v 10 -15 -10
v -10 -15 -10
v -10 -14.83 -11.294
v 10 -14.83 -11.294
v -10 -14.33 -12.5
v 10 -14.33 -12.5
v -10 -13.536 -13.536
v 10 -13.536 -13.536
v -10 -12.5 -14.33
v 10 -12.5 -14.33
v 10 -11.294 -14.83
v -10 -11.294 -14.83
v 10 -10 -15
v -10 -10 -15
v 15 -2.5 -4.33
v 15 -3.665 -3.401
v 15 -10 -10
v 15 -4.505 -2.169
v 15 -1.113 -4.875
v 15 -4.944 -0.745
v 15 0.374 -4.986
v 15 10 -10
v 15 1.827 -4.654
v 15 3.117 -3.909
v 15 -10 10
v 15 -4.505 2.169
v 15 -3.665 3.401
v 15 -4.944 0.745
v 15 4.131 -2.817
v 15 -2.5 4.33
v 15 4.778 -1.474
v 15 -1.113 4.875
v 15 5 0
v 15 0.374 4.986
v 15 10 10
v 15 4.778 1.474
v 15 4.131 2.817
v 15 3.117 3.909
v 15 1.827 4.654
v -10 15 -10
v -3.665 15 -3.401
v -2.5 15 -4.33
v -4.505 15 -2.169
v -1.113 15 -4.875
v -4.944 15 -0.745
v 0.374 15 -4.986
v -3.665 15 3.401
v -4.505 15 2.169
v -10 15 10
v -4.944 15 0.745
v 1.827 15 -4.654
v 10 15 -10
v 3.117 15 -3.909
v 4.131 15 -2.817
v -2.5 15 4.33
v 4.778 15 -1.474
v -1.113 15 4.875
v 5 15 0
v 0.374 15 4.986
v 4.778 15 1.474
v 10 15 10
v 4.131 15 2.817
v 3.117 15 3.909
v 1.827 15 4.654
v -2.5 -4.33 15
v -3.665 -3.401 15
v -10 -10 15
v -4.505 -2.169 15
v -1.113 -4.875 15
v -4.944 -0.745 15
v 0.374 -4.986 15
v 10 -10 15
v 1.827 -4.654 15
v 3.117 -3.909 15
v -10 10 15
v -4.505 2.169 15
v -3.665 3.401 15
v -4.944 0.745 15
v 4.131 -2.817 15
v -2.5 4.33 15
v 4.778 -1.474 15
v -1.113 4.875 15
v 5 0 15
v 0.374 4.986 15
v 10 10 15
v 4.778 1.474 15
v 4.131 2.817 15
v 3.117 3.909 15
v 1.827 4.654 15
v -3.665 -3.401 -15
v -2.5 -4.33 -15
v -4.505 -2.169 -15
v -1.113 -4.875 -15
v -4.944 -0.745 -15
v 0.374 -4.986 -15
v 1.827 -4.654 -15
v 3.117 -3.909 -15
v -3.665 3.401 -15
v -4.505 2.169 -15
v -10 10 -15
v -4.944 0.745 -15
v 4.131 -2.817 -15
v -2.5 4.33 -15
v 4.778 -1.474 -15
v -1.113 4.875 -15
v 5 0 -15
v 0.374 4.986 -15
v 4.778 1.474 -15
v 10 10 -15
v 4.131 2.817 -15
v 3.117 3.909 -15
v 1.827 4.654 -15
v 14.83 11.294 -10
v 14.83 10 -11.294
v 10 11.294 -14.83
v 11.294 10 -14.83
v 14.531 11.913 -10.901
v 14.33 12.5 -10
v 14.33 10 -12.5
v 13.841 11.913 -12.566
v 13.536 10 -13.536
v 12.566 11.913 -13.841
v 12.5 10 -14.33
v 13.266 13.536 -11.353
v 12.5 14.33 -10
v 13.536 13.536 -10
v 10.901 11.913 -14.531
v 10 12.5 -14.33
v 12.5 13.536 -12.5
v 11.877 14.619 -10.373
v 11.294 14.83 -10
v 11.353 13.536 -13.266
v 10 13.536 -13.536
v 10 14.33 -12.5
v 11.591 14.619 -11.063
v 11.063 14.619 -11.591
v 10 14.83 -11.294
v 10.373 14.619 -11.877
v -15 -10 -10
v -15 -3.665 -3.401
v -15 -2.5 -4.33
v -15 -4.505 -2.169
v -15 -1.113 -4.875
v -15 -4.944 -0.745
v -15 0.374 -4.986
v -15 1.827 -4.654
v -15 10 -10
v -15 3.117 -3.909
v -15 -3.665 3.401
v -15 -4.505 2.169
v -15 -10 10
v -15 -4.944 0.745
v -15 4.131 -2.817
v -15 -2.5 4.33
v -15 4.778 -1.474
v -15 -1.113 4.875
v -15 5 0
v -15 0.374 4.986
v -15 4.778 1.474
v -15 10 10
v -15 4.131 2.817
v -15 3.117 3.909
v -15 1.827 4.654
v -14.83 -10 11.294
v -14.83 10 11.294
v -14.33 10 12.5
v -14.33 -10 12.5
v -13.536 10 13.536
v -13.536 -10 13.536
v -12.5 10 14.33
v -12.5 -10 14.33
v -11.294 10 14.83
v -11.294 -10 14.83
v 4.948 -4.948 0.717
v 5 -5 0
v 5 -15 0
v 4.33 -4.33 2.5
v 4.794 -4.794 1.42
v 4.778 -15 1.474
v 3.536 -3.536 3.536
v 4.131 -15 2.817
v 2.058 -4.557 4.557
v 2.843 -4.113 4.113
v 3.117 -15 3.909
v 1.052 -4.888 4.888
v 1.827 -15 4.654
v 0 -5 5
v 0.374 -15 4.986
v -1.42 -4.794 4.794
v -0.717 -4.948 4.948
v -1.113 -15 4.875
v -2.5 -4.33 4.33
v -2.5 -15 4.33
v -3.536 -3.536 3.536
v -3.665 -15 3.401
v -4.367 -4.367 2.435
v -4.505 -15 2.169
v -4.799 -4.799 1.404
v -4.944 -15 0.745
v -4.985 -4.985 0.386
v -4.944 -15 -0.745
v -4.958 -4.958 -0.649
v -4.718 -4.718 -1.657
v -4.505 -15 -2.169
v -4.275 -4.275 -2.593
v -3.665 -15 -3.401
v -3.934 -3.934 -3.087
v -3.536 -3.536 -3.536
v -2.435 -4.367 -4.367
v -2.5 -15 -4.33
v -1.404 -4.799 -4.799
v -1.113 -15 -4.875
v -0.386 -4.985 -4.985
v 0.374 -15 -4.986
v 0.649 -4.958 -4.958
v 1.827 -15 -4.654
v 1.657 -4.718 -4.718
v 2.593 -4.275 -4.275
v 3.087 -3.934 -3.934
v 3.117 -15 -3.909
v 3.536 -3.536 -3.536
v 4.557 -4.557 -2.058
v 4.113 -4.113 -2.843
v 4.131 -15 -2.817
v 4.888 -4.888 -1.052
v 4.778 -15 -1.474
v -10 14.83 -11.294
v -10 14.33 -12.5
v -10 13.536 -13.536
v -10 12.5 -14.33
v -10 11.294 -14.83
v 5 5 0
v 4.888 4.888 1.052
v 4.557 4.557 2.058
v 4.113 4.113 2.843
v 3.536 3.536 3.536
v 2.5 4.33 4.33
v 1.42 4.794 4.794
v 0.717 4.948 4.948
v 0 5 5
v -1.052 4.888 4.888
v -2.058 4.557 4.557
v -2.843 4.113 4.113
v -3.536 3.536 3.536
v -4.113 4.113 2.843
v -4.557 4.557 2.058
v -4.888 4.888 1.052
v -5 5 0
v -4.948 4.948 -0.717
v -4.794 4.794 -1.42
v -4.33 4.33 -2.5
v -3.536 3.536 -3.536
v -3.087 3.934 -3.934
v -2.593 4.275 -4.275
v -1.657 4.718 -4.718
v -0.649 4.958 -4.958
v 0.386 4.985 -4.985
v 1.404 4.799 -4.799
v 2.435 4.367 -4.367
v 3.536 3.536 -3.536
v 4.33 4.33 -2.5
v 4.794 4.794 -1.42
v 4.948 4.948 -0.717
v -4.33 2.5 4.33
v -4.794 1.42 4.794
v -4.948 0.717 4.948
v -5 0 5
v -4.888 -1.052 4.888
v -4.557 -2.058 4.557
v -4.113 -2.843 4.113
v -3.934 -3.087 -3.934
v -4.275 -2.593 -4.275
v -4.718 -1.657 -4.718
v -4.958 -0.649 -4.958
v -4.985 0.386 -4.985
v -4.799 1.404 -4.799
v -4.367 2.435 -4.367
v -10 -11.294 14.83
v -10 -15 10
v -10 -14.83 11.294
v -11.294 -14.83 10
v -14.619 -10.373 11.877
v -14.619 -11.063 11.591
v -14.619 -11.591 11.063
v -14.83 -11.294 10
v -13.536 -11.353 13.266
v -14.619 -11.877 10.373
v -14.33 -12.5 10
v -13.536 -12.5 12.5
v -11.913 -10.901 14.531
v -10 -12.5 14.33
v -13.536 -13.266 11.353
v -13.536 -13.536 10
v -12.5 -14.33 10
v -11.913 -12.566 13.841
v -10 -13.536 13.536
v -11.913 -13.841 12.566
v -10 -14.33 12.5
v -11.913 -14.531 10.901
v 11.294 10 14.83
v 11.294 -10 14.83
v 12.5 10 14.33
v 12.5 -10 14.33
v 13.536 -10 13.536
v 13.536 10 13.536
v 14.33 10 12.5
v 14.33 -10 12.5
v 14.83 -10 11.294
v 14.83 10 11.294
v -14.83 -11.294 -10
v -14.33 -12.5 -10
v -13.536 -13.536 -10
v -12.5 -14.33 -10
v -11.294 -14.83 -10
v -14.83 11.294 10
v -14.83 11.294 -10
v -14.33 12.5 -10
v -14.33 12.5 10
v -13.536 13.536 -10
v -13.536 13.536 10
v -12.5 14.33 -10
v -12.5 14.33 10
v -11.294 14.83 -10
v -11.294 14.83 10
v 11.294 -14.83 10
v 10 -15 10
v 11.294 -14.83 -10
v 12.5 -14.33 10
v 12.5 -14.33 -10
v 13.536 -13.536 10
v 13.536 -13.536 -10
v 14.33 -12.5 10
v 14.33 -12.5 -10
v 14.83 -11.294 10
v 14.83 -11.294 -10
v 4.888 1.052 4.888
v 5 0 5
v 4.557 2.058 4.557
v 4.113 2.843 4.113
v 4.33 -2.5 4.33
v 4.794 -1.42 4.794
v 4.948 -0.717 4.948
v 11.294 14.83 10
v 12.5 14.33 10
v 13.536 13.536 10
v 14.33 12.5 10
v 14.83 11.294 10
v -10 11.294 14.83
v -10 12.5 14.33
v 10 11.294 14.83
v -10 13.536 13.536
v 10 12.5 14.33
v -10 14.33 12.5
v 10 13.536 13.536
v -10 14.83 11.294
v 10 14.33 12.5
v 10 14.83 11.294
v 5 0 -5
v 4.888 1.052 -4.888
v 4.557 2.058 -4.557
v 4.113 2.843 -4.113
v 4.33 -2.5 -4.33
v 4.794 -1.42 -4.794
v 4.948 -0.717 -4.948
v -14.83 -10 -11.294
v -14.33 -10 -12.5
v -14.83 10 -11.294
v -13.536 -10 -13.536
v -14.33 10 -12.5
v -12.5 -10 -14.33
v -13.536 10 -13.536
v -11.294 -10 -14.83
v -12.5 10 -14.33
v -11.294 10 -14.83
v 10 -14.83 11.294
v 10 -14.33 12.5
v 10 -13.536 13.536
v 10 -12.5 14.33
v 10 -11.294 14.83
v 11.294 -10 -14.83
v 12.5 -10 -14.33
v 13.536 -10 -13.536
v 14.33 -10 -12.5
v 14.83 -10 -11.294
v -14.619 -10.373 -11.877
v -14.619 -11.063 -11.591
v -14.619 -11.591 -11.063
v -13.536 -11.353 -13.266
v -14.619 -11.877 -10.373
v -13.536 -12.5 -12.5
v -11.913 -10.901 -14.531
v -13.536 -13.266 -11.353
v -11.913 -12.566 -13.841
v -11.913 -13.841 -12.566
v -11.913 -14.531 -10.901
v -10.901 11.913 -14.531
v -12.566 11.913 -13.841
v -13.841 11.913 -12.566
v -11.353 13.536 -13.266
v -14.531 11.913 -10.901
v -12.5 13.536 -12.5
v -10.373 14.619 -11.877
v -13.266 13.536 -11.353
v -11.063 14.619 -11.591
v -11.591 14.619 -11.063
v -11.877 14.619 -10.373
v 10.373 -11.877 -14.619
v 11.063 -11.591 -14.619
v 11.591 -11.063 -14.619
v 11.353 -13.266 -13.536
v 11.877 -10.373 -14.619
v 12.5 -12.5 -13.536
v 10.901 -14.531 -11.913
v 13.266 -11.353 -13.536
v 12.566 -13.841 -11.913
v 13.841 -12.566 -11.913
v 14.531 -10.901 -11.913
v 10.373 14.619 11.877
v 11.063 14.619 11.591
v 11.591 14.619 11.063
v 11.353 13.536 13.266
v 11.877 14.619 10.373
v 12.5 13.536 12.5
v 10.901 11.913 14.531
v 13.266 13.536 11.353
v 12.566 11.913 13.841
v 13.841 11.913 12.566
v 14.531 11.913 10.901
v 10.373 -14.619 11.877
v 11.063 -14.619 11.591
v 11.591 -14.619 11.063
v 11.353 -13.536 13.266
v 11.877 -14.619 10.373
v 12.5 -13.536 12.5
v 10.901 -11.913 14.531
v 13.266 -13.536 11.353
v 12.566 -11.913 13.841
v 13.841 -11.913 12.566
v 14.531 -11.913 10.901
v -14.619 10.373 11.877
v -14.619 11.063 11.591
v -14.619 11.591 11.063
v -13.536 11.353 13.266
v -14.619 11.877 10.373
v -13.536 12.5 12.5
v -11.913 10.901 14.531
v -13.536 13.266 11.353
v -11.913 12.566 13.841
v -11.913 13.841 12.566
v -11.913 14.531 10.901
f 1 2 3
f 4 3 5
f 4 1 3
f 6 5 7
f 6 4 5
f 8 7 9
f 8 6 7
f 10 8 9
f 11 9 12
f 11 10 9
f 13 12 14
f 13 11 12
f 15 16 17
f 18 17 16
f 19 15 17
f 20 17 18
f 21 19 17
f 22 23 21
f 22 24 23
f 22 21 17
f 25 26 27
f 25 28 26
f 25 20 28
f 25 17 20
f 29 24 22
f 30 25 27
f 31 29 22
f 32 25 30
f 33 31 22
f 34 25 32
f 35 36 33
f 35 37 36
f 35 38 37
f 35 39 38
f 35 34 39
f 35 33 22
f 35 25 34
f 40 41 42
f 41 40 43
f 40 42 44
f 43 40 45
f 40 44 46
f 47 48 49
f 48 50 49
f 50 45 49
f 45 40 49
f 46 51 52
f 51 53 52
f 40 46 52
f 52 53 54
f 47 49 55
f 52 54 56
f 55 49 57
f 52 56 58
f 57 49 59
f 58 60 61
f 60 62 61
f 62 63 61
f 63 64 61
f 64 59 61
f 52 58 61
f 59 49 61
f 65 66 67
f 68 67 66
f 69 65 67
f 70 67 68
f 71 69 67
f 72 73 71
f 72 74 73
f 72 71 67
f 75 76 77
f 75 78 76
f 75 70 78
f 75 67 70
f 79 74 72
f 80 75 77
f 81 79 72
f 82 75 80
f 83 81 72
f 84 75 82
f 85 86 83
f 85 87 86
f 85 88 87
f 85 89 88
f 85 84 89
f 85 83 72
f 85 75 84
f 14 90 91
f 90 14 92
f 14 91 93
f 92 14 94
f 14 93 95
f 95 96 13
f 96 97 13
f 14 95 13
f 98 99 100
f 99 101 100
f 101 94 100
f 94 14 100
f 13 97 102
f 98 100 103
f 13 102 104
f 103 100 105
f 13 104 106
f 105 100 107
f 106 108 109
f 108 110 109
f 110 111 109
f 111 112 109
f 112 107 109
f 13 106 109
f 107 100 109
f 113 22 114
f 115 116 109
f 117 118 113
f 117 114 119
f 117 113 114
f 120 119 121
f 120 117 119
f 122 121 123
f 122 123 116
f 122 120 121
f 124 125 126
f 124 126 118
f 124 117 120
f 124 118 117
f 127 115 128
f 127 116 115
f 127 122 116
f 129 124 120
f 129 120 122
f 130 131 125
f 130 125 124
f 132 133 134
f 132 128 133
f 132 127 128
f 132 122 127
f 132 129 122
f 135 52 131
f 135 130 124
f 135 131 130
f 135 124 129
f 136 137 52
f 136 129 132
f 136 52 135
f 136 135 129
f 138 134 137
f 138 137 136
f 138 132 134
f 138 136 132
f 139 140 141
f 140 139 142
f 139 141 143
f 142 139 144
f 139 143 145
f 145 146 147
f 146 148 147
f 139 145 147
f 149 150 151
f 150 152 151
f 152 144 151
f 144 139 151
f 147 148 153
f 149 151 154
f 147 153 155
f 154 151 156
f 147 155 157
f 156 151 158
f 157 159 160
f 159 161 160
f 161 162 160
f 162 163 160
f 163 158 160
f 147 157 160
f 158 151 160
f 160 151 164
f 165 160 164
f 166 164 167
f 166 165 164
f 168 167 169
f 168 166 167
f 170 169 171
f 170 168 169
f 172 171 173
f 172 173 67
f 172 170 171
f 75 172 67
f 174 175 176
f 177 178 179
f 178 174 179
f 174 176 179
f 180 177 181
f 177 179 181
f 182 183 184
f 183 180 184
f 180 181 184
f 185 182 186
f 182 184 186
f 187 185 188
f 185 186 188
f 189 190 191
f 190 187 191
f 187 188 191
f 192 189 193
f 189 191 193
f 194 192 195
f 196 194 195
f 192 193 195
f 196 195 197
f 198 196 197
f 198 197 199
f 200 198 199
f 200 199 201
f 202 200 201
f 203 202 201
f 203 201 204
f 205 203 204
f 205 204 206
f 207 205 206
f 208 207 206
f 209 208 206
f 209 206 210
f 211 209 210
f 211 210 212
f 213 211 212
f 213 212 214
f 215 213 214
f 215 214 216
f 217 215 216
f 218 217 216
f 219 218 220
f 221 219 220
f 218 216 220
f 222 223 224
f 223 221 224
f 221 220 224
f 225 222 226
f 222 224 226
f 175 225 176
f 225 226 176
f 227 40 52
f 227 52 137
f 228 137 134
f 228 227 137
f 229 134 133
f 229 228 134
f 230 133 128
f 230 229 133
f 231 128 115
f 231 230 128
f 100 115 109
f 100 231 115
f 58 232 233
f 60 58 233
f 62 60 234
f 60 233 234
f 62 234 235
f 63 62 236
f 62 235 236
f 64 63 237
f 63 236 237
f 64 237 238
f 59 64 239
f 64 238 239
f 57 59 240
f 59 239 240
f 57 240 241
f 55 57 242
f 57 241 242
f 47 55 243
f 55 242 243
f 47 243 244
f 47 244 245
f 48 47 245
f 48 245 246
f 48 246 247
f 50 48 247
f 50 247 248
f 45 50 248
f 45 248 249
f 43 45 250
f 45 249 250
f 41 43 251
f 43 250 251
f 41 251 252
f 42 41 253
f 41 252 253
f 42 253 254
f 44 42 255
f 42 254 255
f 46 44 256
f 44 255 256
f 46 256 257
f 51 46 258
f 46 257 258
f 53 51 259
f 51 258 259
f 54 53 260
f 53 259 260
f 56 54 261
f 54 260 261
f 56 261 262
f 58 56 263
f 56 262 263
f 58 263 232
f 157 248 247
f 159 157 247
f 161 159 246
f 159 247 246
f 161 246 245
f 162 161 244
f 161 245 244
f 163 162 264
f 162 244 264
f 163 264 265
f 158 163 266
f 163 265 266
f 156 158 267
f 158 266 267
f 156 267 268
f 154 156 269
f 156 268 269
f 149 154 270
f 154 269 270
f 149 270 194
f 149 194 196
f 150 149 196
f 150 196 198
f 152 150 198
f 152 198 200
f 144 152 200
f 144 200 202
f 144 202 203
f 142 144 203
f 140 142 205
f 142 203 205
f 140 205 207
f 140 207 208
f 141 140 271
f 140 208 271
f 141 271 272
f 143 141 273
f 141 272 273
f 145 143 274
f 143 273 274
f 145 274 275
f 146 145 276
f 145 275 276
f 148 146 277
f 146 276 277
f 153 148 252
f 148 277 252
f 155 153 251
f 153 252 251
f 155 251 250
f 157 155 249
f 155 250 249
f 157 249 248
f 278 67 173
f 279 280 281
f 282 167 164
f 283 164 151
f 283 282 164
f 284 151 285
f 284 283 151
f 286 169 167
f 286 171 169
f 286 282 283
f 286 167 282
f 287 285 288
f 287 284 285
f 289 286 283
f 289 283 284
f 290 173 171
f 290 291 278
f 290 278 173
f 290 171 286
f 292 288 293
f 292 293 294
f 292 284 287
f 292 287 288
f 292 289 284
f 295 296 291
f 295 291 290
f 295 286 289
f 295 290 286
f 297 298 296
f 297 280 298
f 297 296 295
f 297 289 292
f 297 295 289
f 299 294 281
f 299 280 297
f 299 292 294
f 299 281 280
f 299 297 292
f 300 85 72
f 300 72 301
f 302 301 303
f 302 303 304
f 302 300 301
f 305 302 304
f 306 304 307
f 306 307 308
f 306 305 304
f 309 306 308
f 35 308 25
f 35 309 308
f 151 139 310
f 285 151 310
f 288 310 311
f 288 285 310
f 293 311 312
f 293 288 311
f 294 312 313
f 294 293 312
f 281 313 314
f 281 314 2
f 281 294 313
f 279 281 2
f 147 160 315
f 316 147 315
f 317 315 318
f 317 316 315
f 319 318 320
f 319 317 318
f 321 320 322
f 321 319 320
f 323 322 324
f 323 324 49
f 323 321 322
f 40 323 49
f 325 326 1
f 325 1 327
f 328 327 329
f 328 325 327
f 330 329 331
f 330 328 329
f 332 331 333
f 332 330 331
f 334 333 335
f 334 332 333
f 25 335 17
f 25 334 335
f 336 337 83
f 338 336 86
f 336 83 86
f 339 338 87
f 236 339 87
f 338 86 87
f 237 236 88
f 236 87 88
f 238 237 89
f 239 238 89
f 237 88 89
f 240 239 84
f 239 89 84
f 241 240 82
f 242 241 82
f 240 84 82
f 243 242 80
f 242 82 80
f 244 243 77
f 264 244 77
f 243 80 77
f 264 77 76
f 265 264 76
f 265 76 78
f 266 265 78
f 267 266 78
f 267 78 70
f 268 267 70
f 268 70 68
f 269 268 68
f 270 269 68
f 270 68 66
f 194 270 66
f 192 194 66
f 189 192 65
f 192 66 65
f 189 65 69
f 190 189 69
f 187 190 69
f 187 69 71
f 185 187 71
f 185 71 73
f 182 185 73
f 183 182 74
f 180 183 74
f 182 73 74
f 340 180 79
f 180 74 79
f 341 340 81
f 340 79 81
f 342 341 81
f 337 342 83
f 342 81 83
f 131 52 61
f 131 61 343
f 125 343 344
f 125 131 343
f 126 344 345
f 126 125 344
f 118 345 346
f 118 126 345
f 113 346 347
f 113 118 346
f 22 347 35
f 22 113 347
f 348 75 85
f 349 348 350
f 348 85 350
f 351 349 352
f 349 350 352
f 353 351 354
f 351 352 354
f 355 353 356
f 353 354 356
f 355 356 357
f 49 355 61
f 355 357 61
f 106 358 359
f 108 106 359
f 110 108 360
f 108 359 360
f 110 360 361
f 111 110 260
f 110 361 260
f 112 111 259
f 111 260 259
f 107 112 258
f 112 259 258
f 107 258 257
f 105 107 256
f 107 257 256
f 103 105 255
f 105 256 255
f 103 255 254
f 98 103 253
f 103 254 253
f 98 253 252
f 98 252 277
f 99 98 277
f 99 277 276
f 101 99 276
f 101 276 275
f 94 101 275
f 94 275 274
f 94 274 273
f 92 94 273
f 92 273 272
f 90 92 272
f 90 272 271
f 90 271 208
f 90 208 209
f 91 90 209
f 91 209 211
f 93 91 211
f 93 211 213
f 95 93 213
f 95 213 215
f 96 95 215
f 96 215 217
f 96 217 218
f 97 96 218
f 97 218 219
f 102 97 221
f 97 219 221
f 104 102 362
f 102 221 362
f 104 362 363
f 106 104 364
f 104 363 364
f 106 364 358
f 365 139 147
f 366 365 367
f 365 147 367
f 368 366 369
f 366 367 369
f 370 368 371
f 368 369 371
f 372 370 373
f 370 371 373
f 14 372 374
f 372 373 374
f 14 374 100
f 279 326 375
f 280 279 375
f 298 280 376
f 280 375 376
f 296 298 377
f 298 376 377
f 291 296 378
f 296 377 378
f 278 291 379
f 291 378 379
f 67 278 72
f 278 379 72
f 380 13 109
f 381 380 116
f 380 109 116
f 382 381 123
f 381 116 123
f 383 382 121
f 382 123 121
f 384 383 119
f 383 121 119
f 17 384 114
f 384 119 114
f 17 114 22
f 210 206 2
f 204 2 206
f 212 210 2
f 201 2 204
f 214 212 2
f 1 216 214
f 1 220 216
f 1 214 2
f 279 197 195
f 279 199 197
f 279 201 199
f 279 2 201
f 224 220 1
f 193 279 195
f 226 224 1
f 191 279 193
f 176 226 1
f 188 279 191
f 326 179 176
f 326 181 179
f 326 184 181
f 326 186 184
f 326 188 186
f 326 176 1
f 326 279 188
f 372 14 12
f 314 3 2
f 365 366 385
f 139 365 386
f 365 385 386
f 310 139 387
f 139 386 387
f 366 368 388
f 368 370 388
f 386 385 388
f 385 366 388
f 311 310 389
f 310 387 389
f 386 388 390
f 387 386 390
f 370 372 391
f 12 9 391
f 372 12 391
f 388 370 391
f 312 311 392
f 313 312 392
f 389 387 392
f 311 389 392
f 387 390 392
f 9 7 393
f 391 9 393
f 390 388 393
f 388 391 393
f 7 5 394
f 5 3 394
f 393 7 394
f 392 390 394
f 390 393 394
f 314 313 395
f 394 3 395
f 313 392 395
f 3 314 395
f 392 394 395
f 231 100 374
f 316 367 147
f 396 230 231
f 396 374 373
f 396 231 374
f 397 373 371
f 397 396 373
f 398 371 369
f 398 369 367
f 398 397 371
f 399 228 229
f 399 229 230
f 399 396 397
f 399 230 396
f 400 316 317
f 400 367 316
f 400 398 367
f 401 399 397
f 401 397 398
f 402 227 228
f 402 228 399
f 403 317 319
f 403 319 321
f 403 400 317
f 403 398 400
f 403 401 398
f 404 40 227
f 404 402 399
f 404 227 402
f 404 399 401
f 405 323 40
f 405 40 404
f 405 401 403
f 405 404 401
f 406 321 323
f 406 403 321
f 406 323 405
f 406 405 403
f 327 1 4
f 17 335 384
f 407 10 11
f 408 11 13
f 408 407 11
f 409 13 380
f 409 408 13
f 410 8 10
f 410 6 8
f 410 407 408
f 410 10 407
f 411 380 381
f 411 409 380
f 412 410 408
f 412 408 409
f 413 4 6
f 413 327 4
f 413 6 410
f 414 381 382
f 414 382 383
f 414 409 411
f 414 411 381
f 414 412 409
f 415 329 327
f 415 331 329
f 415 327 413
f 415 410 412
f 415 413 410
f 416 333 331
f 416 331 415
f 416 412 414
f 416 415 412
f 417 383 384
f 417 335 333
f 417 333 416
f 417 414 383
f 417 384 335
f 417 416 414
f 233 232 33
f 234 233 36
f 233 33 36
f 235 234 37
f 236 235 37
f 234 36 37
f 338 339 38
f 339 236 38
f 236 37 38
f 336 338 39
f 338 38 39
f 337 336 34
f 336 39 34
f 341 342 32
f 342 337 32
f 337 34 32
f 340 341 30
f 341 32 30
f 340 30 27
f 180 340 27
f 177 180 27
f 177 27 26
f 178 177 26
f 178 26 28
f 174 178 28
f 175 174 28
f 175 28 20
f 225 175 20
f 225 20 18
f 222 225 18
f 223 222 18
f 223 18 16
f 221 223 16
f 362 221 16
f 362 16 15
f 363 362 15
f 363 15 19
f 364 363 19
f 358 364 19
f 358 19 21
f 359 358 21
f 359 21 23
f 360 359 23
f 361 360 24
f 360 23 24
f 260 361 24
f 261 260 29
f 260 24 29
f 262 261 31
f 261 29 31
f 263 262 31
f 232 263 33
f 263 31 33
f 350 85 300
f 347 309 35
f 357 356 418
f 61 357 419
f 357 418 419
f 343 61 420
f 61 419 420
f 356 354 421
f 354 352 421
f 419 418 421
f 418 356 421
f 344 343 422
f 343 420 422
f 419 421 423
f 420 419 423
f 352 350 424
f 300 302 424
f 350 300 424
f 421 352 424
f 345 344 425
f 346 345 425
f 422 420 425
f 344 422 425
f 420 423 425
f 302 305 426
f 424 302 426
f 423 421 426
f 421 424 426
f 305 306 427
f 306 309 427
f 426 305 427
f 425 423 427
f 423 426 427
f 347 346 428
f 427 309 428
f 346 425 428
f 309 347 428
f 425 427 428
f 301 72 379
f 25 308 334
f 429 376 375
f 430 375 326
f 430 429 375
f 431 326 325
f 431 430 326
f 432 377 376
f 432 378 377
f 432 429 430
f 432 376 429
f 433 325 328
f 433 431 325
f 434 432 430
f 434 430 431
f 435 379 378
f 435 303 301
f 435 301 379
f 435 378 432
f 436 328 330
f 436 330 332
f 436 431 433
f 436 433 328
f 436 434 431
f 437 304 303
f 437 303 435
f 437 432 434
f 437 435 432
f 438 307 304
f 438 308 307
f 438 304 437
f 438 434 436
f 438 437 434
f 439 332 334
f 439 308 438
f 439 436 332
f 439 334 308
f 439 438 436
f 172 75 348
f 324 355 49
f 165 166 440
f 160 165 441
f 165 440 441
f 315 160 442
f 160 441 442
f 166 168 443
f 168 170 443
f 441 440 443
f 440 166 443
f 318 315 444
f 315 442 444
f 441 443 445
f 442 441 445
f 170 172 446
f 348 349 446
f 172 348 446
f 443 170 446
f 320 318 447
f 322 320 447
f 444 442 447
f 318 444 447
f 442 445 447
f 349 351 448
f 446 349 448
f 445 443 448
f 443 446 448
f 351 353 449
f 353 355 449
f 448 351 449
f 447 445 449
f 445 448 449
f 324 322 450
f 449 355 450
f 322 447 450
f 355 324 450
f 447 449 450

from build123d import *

# Parameters (mm, degrees)
F0_W         = 30
F0_H         = 30
F1_DEPTH     = 15
F2_R         = 5
F3_DEPTH     = 30.001
F4_R         = 5
F5_DEPTH     = 30.001
F6_R         = 5
F7_DEPTH     = 30.001
F8_R         = 5
F9_T1_DEPTH  = 20
F9_S5_W      = 5
F9_S5_H      = 5
F9_T6_DEPTH  = 5
F9_S11_W     = 5
F9_S11_H     = 5
F9_T12_DEPTH = 5


# Not quite as in the source:
# - a fillet or chamfer that OpenCascade refuses, or shapes differently, is made with other operations: its cross-section is extruded or revolved along the edge and cut away or added


with BuildPart() as f1:
    # F0 (on Top) → F1 (new body, symmetric)
    with BuildSketch(Plane.XY):
        Rectangle(F0_W, F0_H)
    extrude(amount=F1_DEPTH, both=True)

    # F2 (on face) → F3 (cut, through all)
    with BuildSketch(Plane.XY.offset(15)):
        Circle(F2_R)
    extrude(amount=-F3_DEPTH, mode=Mode.SUBTRACT)

    # F4 (on face) → F5 (cut, through all)
    with BuildSketch(Plane.YZ.offset(15)):
        Circle(F4_R)
    extrude(amount=-F5_DEPTH, mode=Mode.SUBTRACT)

    # F6 (on face) → F7 (cut, through all)
    with BuildSketch(Plane.XZ.offset(15)):
        Circle(F6_R)
    extrude(amount=-F7_DEPTH, mode=Mode.SUBTRACT)

    # F8
    f8_edges = [f1.edges().sort_by_distance(p)[0] for p in [
        (15, 0, 15),
        (0, 15, 15),
        (0, -15, 15),
        (-15, 0, 15),
        (-15, 15, 0),
        (15, -15, 0),
        (0, -15, -15),
        (-15, 0, -15),
        (15, 15, 0),
        (15, 0, -15),
        (-15, -15, 0),
    ]]
    fillet(f8_edges, radius=F8_R)

    # F9: fillet of radius 5 on 1 edges, made by hand

    # F9_s2 → F9_t1 (cut)
    with BuildSketch(Plane.YZ.offset(-10)):
        with BuildLine():
            ThreePointArc((15, -10), (13.5355339059, -13.5355339059), (10, -15))
            Line((10, -15), (15, -15))
            Line((15, -15), (15, -10))
        make_face()
    extrude(amount=F9_T1_DEPTH, mode=Mode.SUBTRACT)


with BuildPart() as f9_tool4:
    # F9_s5 → F9_t6 (new body)
    with BuildSketch(Plane.XZ.offset(-10)):
        with Locations((12.5, -12.5)):
            Rectangle(F9_S5_W, F9_S5_H)
    extrude(amount=-F9_T6_DEPTH)

    # F9_s7 → F9_t8 (revolve, cut)
    with BuildSketch(Plane(origin=(10, 10, -10), x_dir=(-0.7071067812, 0, 0.7071067812), z_dir=(-0.7071067812, 0, -0.7071067812))):
        with BuildLine():
            ThreePointArc((0, -5), (5, 0), (0, 5))
            Line((0, 5), (0, -5))
        make_face()
    revolve(axis=Axis((10, 10, -10), (0, 1, 0)), mode=Mode.SUBTRACT)


with BuildPart() as f1_1:
    add(f1.part)

    # F9_t3: cut F9_tool4
    add(f9_tool4.part, mode=Mode.SUBTRACT)


with BuildPart() as f9_tool10:
    # F9_s11 → F9_t12 (new body)
    with BuildSketch(Plane.XZ.offset(-10)):
        with Locations((-12.5, -12.5)):
            Rectangle(F9_S11_W, F9_S11_H)
    extrude(amount=-F9_T12_DEPTH)

    # F9_s13 → F9_t14 (revolve, cut)
    with BuildSketch(Plane(origin=(-10, 10, -10), x_dir=(0.7071067812, 0, 0.7071067812), z_dir=(-0.7071067812, 0, 0.7071067812))):
        with BuildLine():
            ThreePointArc((0, -5), (5, 0), (0, 5))
            Line((0, 5), (0, -5))
        make_face()
    revolve(axis=Axis((-10, 10, -10), (0, 1, 0)), mode=Mode.SUBTRACT)


with BuildPart() as f1_2:
    add(f1_1.part)

    # F9_t9: cut F9_tool10
    add(f9_tool10.part, mode=Mode.SUBTRACT)


solid = f1_2.part
